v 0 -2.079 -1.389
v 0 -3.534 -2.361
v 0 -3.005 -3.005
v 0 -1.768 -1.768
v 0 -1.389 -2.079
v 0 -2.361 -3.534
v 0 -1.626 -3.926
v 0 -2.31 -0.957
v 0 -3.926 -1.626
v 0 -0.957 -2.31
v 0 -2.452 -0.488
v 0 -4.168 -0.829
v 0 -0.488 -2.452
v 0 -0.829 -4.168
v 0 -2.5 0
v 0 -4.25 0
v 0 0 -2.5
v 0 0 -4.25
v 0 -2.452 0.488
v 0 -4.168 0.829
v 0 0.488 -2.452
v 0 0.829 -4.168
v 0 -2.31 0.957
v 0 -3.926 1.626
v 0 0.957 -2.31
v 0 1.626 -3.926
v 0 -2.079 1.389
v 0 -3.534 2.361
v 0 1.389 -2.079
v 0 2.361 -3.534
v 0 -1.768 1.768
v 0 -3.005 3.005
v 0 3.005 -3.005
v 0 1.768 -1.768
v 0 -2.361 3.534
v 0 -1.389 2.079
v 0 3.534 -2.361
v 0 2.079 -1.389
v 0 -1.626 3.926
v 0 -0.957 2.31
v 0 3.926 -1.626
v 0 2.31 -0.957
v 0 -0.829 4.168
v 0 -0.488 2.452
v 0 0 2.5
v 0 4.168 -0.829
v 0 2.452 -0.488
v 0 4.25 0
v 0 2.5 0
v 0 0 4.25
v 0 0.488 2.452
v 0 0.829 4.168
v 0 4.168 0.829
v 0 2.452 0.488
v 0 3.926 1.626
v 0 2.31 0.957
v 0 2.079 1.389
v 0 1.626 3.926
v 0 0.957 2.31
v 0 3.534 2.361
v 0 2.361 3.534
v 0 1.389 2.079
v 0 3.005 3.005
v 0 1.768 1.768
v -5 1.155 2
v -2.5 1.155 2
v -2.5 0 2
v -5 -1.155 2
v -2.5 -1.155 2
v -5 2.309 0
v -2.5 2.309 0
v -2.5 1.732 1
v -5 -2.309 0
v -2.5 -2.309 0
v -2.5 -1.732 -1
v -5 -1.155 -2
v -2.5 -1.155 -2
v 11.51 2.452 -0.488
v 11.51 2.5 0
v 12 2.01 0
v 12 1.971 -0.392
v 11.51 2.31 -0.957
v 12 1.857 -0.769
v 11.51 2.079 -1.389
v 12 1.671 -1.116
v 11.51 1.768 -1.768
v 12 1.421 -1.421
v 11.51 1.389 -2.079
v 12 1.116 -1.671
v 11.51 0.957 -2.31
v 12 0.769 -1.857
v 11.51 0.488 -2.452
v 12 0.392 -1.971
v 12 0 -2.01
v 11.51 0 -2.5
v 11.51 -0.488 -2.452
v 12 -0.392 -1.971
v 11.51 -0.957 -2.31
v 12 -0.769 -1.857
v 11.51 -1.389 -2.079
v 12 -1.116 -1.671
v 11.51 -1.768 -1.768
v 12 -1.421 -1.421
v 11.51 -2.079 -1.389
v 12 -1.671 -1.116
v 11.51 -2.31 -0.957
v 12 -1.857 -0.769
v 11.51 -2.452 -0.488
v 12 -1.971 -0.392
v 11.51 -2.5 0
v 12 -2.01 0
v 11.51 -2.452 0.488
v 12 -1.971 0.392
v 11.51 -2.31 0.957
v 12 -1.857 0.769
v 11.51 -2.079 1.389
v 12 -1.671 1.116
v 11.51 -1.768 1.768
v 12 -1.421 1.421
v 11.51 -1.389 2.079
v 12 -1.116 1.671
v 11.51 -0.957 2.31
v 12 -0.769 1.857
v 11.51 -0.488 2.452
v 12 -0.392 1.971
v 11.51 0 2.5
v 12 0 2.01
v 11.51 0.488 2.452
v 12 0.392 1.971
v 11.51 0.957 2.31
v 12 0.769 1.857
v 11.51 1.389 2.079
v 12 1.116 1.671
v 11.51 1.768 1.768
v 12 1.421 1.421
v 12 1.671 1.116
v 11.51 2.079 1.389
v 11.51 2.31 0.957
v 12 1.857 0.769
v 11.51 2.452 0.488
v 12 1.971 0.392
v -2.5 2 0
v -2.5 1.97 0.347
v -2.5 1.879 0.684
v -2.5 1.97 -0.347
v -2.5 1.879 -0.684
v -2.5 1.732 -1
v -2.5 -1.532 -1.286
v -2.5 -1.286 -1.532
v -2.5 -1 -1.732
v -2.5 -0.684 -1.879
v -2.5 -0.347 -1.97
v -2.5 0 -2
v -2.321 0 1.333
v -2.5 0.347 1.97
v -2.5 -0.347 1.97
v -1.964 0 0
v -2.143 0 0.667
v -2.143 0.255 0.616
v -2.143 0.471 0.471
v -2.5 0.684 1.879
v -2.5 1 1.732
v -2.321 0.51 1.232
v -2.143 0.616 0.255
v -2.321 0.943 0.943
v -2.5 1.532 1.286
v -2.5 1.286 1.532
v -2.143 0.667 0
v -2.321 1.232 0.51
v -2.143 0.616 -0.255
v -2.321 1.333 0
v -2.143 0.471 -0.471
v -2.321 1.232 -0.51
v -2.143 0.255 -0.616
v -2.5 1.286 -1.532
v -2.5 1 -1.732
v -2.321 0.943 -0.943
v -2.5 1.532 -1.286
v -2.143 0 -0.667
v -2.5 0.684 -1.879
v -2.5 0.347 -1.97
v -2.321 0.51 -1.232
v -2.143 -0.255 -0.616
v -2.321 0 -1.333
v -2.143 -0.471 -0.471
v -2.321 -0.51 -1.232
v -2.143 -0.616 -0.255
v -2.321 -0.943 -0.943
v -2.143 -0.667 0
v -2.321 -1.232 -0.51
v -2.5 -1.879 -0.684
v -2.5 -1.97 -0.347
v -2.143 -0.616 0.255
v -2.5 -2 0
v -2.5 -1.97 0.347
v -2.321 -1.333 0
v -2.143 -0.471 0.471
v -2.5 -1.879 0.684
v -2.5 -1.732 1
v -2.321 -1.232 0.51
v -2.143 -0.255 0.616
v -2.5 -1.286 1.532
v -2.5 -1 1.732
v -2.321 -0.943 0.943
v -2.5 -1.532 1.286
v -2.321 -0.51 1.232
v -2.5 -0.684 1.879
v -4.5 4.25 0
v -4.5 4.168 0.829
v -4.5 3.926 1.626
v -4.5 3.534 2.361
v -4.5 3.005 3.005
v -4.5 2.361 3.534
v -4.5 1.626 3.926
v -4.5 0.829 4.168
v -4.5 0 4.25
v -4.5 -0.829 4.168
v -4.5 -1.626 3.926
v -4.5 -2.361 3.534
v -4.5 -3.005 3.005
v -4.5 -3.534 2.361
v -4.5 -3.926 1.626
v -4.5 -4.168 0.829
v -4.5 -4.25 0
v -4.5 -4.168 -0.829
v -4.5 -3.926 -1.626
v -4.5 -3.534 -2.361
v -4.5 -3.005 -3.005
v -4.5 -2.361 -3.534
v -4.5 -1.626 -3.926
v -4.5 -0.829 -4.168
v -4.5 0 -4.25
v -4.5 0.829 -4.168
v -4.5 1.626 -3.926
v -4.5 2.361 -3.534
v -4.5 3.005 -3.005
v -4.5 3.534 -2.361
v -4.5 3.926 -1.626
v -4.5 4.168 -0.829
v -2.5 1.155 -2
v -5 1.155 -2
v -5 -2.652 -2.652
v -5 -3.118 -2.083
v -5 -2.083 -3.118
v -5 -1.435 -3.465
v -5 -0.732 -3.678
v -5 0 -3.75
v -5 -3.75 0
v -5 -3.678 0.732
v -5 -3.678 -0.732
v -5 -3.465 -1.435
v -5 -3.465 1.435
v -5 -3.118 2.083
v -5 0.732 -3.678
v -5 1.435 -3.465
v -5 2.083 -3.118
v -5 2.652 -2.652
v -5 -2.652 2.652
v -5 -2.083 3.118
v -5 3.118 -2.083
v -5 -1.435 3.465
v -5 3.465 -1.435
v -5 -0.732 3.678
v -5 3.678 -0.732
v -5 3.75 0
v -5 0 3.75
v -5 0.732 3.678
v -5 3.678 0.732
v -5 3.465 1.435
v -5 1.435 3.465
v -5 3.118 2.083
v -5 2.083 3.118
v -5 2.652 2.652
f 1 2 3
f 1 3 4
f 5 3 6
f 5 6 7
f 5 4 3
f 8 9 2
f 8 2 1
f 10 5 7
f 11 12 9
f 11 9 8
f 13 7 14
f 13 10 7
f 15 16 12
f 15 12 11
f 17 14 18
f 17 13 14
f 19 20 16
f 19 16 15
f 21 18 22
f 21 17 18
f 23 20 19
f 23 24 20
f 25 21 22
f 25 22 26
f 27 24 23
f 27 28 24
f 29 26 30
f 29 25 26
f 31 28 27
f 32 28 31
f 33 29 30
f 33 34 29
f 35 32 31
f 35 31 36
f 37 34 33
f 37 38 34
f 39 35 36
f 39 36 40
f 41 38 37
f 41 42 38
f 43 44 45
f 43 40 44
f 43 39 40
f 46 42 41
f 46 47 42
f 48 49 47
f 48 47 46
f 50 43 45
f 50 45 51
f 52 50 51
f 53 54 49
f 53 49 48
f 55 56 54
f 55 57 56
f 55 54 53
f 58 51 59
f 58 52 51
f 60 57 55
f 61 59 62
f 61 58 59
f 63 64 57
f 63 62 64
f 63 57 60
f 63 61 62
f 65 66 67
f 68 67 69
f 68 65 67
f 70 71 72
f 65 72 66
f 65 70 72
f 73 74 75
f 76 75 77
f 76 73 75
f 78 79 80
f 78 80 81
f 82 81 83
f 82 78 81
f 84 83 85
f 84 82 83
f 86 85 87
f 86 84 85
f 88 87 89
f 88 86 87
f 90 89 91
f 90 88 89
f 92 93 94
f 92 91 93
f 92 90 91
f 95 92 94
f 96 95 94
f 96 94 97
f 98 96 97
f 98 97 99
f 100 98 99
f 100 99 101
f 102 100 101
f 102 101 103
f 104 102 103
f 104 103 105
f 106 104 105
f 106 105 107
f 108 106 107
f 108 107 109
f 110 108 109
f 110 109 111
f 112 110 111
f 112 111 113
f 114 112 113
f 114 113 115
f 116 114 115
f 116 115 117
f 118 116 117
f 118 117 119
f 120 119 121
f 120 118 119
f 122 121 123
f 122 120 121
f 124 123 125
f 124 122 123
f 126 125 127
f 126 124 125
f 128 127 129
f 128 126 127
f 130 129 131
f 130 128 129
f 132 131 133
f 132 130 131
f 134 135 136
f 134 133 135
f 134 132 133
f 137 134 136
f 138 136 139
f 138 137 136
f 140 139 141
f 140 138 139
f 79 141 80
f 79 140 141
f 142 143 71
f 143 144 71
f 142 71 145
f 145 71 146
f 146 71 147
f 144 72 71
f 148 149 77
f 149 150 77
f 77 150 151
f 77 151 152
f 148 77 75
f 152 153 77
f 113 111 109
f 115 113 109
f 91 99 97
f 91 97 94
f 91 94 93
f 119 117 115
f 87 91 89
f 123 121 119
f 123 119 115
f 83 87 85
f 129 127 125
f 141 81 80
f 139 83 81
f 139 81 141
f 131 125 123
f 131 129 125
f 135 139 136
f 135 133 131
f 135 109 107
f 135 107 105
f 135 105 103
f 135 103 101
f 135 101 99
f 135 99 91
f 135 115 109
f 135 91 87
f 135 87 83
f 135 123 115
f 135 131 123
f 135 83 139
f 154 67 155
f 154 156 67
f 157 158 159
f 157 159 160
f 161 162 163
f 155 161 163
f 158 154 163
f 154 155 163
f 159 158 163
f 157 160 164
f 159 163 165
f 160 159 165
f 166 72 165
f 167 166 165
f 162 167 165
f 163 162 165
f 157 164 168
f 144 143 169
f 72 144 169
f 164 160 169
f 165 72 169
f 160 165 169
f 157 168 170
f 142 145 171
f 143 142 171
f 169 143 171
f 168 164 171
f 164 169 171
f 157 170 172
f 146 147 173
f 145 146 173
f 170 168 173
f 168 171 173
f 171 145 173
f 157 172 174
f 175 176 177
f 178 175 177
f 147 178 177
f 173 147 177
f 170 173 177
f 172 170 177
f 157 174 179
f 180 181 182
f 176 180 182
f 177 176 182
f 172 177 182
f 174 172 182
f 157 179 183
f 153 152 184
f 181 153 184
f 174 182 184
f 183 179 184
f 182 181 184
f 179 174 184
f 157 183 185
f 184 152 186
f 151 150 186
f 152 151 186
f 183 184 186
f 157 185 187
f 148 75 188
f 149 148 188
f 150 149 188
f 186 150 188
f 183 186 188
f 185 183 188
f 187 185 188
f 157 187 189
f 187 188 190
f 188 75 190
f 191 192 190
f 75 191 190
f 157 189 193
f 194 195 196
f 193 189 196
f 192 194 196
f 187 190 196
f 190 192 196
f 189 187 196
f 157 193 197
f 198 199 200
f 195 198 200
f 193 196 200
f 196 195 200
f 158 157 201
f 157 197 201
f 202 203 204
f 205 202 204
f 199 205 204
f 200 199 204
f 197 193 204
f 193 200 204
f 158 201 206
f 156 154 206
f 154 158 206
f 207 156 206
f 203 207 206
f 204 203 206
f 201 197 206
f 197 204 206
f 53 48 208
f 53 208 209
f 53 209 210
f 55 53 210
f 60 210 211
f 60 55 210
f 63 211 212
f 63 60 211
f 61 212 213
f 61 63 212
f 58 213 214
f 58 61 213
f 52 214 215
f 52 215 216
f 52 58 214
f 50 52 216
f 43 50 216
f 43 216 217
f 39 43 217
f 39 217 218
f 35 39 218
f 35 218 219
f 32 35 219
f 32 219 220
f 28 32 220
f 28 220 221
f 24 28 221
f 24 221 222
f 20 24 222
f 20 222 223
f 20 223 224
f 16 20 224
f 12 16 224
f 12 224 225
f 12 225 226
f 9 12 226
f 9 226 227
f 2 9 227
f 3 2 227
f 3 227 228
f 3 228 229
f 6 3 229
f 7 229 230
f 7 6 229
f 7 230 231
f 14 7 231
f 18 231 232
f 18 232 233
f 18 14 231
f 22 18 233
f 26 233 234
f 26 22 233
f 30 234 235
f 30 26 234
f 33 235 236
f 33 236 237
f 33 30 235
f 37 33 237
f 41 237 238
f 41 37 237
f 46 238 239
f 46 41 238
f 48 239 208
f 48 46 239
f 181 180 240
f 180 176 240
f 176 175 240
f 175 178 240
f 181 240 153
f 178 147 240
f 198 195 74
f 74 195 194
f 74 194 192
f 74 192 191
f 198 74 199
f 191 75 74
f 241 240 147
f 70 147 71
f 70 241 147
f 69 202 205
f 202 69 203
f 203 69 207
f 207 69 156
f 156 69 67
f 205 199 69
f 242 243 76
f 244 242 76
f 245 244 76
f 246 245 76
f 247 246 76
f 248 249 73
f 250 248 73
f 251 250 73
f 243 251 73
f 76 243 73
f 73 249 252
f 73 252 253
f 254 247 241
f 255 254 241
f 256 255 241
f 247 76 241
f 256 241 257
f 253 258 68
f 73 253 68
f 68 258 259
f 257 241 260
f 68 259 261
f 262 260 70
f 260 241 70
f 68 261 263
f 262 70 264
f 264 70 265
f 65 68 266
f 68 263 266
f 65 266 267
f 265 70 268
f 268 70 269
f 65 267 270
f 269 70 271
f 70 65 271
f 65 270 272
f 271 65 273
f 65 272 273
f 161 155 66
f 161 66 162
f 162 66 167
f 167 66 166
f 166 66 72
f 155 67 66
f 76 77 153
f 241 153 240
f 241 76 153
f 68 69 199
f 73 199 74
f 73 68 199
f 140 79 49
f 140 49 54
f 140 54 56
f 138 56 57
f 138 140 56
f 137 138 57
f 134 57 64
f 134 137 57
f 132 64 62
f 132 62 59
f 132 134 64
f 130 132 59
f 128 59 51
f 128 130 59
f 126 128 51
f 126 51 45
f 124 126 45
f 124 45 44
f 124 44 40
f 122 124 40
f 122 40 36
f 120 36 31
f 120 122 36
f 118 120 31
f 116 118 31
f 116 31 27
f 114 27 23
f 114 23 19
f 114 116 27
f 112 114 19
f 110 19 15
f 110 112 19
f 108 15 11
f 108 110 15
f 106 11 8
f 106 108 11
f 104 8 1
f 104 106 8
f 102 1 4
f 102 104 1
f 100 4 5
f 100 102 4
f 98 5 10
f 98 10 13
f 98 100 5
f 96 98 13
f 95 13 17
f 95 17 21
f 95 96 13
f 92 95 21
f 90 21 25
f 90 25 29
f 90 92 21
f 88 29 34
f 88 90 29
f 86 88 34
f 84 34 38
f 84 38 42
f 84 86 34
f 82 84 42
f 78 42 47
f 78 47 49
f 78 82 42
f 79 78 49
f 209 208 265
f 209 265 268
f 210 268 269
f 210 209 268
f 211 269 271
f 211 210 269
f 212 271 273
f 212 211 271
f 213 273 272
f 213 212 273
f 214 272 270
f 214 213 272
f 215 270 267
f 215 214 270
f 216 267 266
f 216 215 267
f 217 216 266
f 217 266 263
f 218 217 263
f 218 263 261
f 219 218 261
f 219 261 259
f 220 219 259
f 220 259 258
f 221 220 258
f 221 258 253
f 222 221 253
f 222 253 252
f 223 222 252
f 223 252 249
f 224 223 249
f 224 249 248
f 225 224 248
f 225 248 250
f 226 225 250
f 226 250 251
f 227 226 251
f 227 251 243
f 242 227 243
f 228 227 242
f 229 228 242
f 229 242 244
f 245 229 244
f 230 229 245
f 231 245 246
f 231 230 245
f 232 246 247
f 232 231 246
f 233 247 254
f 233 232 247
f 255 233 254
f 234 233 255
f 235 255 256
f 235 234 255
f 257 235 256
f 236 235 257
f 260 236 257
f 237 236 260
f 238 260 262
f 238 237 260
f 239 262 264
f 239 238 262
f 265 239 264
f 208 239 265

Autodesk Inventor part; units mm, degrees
sketch "Sketch_1" plane through (0, 0, 0) normal (0, 0, 1) x (1, 0, 0)
  line L0 (12, 0) -> (-5, 0)
  line L1 (-5, 0) -> (-5, 3.75)
  line L2 (-5, 3.75) -> (-4.5, 4.25)
  line L3 (-4.5, 4.25) -> (0, 4.25)
  line L4 (0, 4.25) -> (0, 2.5)
  line L5 (0, 2.5) -> (11.5095, 2.5)
  line L6 (11.5095, 2.5) -> (12, 2.0095)
  line L7 (12, 2.0095) -> (12, 0)
  line L8 (12, 0) -> (-5, 0)
revolve "Revolution1" add sketch "Sketch_1" angle 360 about axis through (12, 0, 0) along (1, 0, 0)
thread "Thread1" size "M5x0.8" class "6g" standard "ISO Metric profile" length 10.5095
sketch "Sketch2" plane through (-5, 0, 0) normal (-1, 0, 0) x (0, 0, 1)
  point P0 (0, 0)
hole "Hole1" at (-5, 0, 0) direction (1, 0, 0) diameter 4 depth 2.5 tip angle 150
sketch "Sketch_3" plane through (-5, 0, 0) normal (1, 0, 0) x (0, 0, -1)
  line L0 (-2, 1.1547) -> (-2, -1.1547)
  line L1 (-2, -1.1547) -> (0, -2.3094)
  line L2 (0, -2.3094) -> (2, -1.1547)
  line L3 (2, -1.1547) -> (2, 1.1547)
  line L4 (2, 1.1547) -> (0, 2.3094)
  line L5 (0, 2.3094) -> (-2, 1.1547)
extrude "Extrusion1" cut sketch "Sketch_3" along normal blind 2.5
ref_plane "bolt_to_nut_XY" through (12, 0, 0) normal (1, 0, 0) x (0, 0, -1)
ref_plane "bolt_to_nut_YZ" through (12, 0, 0) normal (0, 0, -1) x (0, 1, 0)
ref_plane "bolt_to_nut_ZX" through (12, 0, 0) normal (0, 1, 0) x (1, 0, 0)
ref_plane "screw1_XY" through (0, 0, 0) normal (1, 0, 0) x (0, 0, -1)
ref_plane "screw1_YZ" through (0, 0, 0) normal (0, 0, -1) x (0, 1, 0)
ref_plane "screw1_ZX" through (0, 0, 0) normal (0, 1, 0) x (1, 0, 0)
properties part number "CB5-12" material "鋼、炭素鋼"
